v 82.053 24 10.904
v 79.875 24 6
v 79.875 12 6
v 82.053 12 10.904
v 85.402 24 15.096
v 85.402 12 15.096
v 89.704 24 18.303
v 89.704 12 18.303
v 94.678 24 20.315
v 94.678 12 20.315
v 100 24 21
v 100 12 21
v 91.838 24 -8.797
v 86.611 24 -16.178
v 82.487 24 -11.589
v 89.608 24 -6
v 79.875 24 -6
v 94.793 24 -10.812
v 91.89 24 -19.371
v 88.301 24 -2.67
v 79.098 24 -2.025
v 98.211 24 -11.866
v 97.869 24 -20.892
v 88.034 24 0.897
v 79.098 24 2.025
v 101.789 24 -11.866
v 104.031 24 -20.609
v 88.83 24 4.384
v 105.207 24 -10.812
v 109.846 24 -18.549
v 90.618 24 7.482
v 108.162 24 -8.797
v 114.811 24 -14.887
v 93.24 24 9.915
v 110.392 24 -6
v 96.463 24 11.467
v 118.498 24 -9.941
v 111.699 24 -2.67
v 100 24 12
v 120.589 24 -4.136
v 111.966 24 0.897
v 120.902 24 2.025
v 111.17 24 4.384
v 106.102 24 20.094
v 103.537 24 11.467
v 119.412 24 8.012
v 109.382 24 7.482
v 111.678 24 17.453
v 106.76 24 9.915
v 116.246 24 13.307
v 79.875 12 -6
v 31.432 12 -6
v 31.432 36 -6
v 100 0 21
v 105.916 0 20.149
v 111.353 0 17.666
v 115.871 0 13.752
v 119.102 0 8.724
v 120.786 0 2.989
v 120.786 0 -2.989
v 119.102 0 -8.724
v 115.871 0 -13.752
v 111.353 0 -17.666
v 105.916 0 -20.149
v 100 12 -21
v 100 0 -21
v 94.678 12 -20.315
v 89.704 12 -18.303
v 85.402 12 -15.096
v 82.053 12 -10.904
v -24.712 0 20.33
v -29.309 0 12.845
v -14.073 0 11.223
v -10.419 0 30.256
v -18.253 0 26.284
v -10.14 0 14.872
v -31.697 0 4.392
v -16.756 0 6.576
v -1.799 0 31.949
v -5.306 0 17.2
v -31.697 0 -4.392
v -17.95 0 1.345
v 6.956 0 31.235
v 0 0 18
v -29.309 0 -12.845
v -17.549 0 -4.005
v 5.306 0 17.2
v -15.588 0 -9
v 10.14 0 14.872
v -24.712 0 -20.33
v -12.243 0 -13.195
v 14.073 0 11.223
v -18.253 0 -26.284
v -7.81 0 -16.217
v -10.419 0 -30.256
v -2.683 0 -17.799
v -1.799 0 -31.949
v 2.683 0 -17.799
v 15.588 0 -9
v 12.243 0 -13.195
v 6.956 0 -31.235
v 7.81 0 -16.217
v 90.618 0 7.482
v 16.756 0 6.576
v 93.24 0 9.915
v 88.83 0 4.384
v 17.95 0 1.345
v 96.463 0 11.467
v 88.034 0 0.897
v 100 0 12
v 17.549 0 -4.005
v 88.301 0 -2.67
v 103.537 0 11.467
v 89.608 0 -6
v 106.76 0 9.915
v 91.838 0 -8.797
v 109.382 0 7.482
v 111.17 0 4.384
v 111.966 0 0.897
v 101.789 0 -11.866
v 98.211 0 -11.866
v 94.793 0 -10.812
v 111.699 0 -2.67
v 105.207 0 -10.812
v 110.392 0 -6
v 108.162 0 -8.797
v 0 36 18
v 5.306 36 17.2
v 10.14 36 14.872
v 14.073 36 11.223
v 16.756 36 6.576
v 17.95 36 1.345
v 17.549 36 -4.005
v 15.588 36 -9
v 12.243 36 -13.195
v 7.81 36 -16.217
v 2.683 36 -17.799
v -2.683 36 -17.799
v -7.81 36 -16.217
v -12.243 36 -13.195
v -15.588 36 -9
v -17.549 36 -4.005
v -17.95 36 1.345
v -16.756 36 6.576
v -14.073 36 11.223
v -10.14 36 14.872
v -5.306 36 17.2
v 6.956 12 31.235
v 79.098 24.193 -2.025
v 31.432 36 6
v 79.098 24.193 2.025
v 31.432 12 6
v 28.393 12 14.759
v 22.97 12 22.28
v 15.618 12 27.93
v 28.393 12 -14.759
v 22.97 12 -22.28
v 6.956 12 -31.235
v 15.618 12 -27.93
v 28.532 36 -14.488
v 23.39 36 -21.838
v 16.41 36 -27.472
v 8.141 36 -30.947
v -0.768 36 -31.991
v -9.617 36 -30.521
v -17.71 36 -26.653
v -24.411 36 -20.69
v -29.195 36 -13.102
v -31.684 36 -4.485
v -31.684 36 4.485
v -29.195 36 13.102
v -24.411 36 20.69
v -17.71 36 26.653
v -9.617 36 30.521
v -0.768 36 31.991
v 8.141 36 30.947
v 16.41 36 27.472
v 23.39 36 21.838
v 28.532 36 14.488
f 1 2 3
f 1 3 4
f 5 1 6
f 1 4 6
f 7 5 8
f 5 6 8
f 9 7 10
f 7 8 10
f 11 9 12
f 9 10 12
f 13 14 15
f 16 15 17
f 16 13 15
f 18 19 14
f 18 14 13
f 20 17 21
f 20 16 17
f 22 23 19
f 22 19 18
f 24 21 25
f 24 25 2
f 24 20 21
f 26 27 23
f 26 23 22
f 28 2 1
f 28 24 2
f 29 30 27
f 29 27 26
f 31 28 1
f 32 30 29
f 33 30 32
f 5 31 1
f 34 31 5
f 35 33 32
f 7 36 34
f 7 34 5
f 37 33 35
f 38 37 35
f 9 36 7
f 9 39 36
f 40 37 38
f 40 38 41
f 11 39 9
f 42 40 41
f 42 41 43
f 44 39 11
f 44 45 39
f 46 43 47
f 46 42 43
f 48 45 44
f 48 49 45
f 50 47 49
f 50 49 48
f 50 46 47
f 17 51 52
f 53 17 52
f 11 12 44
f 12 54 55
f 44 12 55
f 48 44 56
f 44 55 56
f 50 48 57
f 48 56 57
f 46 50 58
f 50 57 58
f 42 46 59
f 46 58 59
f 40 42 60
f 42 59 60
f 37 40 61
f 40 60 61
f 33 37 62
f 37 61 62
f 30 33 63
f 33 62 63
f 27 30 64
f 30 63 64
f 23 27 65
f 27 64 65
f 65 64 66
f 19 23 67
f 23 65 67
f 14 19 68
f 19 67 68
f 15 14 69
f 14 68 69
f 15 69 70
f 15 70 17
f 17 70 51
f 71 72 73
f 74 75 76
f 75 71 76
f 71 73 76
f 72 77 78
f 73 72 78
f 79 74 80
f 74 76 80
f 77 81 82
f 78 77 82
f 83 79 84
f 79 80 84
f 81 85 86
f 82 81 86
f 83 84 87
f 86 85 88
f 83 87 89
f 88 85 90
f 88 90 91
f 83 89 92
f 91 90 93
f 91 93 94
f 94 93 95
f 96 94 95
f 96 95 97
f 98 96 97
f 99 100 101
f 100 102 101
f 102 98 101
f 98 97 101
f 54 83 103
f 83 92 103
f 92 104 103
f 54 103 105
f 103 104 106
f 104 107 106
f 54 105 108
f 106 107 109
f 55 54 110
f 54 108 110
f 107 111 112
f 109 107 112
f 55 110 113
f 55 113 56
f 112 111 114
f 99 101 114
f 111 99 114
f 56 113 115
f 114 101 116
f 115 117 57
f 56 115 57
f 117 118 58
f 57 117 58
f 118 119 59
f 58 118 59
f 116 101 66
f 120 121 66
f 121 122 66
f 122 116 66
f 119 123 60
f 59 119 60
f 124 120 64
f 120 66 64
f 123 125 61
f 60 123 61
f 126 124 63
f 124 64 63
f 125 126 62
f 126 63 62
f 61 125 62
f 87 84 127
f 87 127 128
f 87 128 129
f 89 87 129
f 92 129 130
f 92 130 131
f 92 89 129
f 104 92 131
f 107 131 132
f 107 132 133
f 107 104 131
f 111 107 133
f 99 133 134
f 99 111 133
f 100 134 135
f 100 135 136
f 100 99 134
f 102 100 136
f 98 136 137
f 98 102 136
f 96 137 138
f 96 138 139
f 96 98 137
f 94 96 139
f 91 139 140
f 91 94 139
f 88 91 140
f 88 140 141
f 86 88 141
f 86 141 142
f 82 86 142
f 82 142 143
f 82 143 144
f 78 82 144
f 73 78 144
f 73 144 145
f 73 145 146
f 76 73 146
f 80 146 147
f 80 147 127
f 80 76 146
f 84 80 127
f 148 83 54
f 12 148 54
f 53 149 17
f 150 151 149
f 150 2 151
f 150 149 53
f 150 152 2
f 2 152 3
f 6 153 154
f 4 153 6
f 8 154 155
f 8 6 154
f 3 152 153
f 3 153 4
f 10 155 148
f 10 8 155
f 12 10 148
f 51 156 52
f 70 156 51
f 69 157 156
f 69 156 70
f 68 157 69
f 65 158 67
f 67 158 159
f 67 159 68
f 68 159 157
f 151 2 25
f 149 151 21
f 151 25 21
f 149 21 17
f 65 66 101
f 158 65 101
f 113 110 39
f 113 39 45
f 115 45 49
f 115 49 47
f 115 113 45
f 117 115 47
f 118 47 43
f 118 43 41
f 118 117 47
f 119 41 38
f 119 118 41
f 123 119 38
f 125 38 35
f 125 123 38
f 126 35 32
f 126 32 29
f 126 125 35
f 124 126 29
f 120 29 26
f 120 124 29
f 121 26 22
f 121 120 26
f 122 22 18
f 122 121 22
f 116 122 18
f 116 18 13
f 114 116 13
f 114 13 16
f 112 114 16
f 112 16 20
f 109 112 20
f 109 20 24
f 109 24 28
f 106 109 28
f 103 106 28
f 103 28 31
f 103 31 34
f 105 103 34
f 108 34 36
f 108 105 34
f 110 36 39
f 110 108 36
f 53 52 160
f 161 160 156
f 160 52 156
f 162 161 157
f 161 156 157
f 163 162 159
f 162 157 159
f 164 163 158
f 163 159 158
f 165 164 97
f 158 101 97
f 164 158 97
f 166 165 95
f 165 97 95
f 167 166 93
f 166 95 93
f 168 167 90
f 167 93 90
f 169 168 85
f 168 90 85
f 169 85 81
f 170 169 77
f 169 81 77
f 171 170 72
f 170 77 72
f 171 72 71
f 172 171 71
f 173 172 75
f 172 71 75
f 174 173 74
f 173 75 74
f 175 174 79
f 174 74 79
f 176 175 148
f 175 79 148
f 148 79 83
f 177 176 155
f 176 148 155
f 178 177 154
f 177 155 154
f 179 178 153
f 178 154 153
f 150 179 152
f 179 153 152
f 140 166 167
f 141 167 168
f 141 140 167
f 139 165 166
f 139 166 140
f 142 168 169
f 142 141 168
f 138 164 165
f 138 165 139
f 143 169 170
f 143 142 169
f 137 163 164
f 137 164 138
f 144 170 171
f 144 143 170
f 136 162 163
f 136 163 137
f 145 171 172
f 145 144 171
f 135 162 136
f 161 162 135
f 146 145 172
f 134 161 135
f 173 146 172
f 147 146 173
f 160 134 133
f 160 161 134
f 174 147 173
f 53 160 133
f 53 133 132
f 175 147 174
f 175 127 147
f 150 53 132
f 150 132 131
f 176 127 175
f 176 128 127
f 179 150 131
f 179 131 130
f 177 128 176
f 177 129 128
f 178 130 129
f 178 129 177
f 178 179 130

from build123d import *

# Parameters (mm, degrees)
SKETCH1_R           = 32
SKETCH1_R_2         = 18
BOSS_EXTRUDE1_DEPTH = 36
SKETCH1_6_R         = 21
SKETCH1_6_R_2       = 12
BOSS_EXTRUDE2_DEPTH = 24
BOSS_EXTRUDE3_DEPTH = 12
BOSS_EXTRUDE4_DEPTH = 36
CUT_EXTRUDE2_DEPTH  = 32


with BuildPart() as part:
    # Sketch1 → Boss-Extrude1 (new body)
    with BuildSketch(Plane(origin=(0, 0, 0), x_dir=(1, 0, 0), z_dir=(0, 1, 0))):
        with Locations(Location((0, 0, 0), (0, 0, 270))):  # turned: the seam where the file's is
            Circle(SKETCH1_R)
        with Locations(Location((0, 0, 0), (0, 0, 270))):  # turned: the seam where the file's is
            Circle(SKETCH1_R_2, mode=Mode.SUBTRACT)
    extrude(amount=BOSS_EXTRUDE1_DEPTH)



with BuildPart() as body_2:
    # Sketch1_6 → Boss-Extrude2 (new body)
    with BuildSketch(Plane(origin=(0, 0, 0), x_dir=(1, 0, 0), z_dir=(0, 1, 0))):
        with Locations(Location((100, 0, 0), (0, 0, 270))):  # turned: the seam where the file's is
            Circle(SKETCH1_6_R)
        with Locations(Location((100, 0, 0), (0, 0, 270))):  # turned: the seam where the file's is
            Circle(SKETCH1_6_R_2, mode=Mode.SUBTRACT)
    extrude(amount=BOSS_EXTRUDE2_DEPTH)


with BuildPart() as part_1:
    add(part.part)

    add(body_2.part)  # Boss-Extrude3 merges body 2
    # Sketch2 → Boss-Extrude3 (add)
    with BuildSketch(Plane(origin=(0, 0, 0), x_dir=(1, 0, 0), z_dir=(0, 1, 0))):
        with BuildLine():
            Line((100, 21), (6.955834404, 31.234858216))
            ThreePointArc((6.955834404, 31.234858216), (32, 0), (6.955834404, -31.234858216))
            Line((6.955834404, -31.234858216), (100, -21))
            ThreePointArc((100, -21), (79, 0), (100, 21))
        make_face()
    extrude(amount=BOSS_EXTRUDE3_DEPTH)

    # Sketch3 → Boss-Extrude4 (add)
    with BuildSketch(Plane(origin=(0, 0, 0), x_dir=(1, 0, 0), z_dir=(0, 1, 0))):
        with BuildLine():
            Line((31.432467291, -6), (79.875388203, -6))
            ThreePointArc((79.875388203, -6), (79, 0), (79.875388203, 6))
            Line((79.875388203, 6), (31.432467291, 6))
            ThreePointArc((31.432467291, 6), (32, 0), (31.432467291, -6))
        make_face()
    extrude(amount=BOSS_EXTRUDE4_DEPTH)

    # Sketch5 → Cut-Extrude2 (cut)
    with BuildSketch(Plane.XY.offset(6)):
        Polygon((79.875388203, 24), (31.432467291, 36), (79.875388203, 36), align=None)
    extrude(amount=-CUT_EXTRUDE2_DEPTH, mode=Mode.SUBTRACT)


solid = part_1.part
